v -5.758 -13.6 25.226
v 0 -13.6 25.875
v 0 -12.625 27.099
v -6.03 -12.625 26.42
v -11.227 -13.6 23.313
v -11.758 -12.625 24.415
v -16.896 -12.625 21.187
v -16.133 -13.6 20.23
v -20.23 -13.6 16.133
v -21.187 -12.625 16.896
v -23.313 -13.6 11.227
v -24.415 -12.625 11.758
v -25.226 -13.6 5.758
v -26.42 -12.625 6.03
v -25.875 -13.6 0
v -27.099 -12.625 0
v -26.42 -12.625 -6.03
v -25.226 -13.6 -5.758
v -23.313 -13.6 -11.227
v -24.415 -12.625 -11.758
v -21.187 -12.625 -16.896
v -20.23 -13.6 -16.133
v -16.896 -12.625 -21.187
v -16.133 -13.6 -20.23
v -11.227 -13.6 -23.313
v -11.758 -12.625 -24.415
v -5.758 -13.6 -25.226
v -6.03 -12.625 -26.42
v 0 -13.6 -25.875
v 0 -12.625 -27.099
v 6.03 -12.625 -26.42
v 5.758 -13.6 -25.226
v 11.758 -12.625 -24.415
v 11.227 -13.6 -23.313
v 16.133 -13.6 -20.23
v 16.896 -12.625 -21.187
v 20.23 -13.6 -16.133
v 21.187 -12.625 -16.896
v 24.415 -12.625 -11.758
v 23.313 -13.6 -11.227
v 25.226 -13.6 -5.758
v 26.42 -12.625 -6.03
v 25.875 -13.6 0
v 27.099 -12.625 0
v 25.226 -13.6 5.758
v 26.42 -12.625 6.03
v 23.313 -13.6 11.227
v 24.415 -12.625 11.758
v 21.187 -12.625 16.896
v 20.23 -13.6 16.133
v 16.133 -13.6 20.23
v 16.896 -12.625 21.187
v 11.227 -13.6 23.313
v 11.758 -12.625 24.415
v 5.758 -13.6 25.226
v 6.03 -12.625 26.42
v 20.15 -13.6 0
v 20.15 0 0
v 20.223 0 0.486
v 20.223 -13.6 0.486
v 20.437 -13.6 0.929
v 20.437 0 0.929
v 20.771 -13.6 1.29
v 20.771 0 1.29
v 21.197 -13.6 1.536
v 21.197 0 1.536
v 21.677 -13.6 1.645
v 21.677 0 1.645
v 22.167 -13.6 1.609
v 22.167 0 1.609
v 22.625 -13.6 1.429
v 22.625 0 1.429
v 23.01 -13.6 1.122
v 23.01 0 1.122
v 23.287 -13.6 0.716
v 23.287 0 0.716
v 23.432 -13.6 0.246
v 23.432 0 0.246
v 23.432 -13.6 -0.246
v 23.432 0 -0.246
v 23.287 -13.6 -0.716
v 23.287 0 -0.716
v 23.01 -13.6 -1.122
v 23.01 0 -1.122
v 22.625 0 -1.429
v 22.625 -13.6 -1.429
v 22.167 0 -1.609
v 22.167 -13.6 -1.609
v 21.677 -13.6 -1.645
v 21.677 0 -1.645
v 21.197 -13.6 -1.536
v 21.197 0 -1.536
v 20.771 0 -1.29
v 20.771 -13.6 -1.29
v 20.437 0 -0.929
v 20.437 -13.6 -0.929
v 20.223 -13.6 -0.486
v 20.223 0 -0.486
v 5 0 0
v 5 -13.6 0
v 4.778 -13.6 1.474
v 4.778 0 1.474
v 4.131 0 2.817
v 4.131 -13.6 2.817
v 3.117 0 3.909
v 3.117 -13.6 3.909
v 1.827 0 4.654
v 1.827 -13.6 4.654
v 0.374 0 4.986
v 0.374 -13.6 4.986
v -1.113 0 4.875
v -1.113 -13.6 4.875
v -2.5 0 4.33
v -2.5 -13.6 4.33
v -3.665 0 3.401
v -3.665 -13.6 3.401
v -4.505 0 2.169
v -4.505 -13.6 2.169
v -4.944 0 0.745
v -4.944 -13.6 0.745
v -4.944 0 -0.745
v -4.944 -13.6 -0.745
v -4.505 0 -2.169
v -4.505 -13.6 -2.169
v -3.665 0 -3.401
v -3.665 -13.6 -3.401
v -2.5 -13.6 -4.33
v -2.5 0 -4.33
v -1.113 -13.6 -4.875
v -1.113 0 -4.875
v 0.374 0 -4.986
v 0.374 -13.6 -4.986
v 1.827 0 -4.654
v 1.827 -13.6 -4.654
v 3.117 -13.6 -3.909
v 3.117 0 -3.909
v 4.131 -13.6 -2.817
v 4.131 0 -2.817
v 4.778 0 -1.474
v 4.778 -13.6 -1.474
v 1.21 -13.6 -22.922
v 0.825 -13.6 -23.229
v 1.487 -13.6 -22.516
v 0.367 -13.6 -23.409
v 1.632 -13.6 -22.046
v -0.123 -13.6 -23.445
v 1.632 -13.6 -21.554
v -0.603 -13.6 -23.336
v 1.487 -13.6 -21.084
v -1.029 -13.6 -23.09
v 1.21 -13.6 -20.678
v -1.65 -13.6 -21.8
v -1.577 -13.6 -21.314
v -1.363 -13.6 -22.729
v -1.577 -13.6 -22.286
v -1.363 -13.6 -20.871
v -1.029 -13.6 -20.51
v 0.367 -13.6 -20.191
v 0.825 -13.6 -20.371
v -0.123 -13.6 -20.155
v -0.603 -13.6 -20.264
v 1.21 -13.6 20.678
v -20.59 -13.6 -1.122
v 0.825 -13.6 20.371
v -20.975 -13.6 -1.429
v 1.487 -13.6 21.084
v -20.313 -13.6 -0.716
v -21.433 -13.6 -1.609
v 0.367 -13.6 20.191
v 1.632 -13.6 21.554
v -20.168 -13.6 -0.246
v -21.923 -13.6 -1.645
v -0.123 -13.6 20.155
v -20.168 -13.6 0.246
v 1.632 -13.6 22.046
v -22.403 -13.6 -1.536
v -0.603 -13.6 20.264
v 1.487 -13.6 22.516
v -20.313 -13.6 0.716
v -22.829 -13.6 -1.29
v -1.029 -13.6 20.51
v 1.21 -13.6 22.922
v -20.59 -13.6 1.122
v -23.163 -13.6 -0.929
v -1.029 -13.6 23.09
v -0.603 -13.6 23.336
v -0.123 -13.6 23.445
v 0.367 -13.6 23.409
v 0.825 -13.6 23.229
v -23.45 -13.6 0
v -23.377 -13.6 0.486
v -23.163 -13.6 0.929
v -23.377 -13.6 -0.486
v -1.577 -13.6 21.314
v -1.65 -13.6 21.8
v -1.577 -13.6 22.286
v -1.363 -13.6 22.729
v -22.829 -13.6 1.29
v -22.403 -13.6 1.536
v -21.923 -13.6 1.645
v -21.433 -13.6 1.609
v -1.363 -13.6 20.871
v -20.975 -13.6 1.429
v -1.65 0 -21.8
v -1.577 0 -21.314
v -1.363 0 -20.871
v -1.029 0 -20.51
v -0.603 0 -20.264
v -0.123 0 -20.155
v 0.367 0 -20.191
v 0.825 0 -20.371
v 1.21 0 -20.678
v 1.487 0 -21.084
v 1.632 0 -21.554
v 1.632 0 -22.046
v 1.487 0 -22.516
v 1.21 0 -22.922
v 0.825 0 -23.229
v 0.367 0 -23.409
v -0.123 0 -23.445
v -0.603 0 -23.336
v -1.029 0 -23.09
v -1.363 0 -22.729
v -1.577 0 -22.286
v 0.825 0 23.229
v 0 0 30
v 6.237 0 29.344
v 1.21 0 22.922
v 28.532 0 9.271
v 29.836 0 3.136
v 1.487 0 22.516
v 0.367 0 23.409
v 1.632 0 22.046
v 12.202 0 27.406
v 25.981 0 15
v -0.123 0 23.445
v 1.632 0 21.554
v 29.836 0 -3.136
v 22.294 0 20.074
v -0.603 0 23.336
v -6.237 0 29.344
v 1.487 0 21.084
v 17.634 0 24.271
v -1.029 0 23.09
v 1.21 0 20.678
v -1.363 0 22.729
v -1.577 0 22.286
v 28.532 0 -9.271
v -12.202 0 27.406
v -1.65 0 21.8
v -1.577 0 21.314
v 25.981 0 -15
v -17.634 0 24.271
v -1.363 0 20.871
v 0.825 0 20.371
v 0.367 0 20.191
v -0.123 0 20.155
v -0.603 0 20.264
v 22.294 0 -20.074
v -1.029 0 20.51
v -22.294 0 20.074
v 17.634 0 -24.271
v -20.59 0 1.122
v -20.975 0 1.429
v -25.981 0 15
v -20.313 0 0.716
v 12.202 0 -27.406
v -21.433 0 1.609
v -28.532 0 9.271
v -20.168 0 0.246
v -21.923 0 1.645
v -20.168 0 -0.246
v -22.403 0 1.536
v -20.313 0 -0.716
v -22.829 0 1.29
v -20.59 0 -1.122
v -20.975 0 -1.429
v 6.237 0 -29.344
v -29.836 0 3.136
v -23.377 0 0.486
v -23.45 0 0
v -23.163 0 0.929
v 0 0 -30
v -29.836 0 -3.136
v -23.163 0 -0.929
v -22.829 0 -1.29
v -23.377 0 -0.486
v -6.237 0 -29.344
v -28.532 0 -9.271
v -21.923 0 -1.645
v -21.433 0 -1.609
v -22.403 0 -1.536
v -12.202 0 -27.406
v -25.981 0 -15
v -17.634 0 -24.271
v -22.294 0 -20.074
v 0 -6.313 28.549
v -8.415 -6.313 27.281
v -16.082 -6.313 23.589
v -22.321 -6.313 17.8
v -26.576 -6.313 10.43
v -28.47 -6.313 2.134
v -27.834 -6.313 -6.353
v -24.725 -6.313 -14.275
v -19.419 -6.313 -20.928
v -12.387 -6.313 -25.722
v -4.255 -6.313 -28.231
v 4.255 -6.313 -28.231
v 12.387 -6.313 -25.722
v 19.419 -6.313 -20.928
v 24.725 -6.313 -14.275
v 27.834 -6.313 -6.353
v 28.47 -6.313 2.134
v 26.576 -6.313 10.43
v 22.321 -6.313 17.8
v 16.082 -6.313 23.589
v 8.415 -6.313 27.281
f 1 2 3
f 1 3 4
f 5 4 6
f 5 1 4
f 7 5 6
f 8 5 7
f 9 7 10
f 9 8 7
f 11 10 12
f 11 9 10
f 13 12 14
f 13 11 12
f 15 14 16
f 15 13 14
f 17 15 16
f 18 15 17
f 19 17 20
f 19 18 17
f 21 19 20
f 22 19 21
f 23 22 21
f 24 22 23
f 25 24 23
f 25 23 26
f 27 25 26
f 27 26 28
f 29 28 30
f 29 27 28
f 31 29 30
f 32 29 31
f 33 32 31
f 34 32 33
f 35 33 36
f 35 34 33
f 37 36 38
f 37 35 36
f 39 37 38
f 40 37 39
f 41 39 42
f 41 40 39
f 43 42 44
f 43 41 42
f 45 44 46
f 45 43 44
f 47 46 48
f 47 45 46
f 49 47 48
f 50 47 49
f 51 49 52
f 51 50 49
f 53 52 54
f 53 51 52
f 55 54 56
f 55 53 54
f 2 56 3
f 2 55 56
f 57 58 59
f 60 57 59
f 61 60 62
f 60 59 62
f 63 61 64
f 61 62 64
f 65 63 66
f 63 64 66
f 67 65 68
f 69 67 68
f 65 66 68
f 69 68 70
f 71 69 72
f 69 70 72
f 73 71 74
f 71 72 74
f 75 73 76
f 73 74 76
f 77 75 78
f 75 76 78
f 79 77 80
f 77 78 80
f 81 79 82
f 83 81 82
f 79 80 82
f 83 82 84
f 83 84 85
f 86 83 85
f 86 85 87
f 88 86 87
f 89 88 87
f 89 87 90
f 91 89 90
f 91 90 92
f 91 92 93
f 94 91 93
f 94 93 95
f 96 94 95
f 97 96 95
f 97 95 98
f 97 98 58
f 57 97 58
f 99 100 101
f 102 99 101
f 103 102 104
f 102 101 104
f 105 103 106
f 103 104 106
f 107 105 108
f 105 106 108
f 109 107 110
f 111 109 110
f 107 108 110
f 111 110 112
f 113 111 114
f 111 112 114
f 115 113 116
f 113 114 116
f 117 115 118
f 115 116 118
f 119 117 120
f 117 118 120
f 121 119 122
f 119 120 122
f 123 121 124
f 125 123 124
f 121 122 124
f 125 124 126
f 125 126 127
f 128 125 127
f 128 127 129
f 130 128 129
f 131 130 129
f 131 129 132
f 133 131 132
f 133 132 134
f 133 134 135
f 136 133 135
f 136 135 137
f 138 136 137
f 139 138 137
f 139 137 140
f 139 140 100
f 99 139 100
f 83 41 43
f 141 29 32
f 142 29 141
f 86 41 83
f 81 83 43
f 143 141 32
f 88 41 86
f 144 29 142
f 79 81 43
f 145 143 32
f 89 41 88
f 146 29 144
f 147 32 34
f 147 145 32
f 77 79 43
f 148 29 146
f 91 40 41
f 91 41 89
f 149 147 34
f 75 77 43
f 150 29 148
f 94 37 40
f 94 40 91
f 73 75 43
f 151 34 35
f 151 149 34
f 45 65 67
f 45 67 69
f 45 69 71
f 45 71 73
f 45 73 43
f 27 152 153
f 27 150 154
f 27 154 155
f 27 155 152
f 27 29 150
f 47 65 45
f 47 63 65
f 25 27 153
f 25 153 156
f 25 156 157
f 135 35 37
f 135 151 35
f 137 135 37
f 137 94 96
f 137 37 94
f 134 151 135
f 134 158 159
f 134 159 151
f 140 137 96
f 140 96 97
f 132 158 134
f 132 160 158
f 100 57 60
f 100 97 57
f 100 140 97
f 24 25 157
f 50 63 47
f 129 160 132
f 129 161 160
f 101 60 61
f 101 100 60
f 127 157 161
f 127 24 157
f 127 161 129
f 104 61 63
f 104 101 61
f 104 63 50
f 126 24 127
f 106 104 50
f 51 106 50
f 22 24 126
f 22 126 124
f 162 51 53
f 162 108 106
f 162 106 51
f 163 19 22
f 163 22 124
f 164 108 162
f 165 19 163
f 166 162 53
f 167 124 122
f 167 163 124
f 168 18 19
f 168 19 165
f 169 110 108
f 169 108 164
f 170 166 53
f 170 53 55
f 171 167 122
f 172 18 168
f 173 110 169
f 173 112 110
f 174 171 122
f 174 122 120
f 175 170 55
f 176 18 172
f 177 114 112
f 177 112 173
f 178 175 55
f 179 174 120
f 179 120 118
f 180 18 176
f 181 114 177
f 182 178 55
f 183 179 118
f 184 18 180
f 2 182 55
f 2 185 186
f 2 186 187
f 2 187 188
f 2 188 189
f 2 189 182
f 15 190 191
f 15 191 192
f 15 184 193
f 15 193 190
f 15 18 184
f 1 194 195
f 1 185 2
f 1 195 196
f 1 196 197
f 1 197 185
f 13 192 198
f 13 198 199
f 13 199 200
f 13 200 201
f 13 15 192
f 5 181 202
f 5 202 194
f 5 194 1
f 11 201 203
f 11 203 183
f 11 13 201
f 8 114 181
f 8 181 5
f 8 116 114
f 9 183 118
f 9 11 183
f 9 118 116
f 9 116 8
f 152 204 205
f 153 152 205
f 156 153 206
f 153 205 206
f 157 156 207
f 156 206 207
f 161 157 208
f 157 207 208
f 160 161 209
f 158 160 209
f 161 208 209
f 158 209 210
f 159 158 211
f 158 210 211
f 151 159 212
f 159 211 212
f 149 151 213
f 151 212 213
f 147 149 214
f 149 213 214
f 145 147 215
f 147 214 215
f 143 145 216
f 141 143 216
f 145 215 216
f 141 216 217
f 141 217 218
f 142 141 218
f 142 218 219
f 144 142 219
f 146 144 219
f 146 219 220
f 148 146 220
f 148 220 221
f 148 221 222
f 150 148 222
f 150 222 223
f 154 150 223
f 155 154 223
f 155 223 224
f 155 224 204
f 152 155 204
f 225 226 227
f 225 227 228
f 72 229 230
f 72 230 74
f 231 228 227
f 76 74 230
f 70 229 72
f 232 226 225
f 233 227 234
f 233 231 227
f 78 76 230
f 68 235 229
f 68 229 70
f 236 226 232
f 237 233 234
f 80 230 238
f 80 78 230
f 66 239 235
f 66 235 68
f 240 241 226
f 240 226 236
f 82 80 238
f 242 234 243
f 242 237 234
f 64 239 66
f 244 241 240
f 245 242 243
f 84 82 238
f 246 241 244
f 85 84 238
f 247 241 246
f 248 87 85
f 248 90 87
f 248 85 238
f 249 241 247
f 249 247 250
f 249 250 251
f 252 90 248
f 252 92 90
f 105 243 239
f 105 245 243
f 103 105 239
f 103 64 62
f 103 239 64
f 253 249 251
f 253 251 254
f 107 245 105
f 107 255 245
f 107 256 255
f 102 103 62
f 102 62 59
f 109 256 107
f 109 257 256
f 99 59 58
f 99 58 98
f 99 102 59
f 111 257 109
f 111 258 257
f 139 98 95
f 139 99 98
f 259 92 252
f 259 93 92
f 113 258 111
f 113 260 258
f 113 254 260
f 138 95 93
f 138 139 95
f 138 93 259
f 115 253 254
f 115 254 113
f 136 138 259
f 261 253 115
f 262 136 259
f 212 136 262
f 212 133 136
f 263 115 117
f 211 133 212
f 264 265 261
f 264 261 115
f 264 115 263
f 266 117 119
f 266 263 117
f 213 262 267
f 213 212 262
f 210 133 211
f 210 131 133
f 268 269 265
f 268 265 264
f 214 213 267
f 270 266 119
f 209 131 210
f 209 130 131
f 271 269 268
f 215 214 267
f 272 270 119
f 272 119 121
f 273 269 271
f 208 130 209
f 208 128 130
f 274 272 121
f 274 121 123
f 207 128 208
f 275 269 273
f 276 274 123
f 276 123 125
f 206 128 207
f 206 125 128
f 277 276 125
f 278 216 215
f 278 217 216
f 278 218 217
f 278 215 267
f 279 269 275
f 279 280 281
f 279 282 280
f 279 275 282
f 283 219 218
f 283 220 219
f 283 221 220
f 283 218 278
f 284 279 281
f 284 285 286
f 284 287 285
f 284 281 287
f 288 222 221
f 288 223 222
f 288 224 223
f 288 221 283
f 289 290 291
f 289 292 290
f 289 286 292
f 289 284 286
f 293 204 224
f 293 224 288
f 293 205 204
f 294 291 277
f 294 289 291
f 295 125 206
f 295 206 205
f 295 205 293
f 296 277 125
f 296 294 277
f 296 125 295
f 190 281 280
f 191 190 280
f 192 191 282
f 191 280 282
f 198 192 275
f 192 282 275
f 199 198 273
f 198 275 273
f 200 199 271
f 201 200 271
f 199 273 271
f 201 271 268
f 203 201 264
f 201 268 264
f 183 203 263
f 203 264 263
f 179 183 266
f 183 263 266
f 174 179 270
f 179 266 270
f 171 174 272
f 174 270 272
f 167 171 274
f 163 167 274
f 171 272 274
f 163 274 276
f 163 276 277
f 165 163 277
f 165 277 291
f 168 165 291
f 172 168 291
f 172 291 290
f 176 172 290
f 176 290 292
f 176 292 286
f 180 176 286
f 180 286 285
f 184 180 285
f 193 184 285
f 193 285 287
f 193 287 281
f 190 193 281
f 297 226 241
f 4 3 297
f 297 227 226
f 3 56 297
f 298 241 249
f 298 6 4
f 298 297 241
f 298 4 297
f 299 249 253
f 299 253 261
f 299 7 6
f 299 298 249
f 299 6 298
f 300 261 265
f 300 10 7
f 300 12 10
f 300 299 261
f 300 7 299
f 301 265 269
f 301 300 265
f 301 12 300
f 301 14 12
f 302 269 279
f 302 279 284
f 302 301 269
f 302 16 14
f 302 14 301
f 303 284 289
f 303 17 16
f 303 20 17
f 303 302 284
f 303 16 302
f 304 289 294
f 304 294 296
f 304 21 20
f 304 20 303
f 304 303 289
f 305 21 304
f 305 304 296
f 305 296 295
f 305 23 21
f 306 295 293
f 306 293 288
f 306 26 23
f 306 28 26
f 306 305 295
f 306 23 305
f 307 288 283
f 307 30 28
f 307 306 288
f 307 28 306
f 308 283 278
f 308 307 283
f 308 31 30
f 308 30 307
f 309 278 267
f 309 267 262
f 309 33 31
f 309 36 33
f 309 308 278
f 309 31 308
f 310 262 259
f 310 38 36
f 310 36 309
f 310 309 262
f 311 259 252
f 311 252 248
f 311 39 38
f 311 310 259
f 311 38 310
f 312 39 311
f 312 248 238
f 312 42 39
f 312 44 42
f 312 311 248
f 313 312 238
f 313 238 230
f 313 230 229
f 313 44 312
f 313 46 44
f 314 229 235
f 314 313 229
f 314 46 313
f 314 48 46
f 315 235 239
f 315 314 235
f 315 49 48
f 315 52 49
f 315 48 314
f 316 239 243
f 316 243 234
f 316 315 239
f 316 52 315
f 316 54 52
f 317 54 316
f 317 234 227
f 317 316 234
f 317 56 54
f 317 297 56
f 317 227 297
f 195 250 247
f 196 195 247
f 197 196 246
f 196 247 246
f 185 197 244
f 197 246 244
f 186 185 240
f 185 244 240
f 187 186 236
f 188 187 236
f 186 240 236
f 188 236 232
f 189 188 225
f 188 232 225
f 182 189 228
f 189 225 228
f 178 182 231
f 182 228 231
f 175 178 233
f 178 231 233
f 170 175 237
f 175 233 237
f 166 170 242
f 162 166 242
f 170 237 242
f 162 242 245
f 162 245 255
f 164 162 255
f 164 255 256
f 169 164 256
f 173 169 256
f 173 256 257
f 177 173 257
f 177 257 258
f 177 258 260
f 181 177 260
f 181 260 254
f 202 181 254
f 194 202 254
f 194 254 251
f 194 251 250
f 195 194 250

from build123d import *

# Parameters (mm, degrees)
F3_D    = 10
F5_SIZE = 1
F6_D    = 3.3


with BuildPart() as f1:
    # F0 (on Right) → F1 (revolve)
    with BuildSketch(Plane.YZ):
        Polygon((-13.6, 0), (0, 0), (0, 30), (-13.6, 26.875), align=None)
    revolve(axis=Axis((0, -6.8, 0), (0, -1, 0)))

    # F3 (through all)
    with Locations(Plane(origin=(0, 0, 0), x_dir=(-1, 0, 0), z_dir=(0, 1, 0))):
        with Locations((0, 0)):
            Hole(F3_D / 2)

    # F5
    f5_edges = [f1.edges().sort_by_distance(p)[0] for p in [
        (0, -13.6, -26.875),
    ]]
    chamfer(f5_edges, length=F5_SIZE)

    # F6 (through all)
    with Locations(Plane.XZ.offset(13.6)):
        with Locations((0, 21.8), (21.8, 0), (0, -21.8), (-21.8, 0)):
            Hole(F6_D / 2)


solid = f1.part
